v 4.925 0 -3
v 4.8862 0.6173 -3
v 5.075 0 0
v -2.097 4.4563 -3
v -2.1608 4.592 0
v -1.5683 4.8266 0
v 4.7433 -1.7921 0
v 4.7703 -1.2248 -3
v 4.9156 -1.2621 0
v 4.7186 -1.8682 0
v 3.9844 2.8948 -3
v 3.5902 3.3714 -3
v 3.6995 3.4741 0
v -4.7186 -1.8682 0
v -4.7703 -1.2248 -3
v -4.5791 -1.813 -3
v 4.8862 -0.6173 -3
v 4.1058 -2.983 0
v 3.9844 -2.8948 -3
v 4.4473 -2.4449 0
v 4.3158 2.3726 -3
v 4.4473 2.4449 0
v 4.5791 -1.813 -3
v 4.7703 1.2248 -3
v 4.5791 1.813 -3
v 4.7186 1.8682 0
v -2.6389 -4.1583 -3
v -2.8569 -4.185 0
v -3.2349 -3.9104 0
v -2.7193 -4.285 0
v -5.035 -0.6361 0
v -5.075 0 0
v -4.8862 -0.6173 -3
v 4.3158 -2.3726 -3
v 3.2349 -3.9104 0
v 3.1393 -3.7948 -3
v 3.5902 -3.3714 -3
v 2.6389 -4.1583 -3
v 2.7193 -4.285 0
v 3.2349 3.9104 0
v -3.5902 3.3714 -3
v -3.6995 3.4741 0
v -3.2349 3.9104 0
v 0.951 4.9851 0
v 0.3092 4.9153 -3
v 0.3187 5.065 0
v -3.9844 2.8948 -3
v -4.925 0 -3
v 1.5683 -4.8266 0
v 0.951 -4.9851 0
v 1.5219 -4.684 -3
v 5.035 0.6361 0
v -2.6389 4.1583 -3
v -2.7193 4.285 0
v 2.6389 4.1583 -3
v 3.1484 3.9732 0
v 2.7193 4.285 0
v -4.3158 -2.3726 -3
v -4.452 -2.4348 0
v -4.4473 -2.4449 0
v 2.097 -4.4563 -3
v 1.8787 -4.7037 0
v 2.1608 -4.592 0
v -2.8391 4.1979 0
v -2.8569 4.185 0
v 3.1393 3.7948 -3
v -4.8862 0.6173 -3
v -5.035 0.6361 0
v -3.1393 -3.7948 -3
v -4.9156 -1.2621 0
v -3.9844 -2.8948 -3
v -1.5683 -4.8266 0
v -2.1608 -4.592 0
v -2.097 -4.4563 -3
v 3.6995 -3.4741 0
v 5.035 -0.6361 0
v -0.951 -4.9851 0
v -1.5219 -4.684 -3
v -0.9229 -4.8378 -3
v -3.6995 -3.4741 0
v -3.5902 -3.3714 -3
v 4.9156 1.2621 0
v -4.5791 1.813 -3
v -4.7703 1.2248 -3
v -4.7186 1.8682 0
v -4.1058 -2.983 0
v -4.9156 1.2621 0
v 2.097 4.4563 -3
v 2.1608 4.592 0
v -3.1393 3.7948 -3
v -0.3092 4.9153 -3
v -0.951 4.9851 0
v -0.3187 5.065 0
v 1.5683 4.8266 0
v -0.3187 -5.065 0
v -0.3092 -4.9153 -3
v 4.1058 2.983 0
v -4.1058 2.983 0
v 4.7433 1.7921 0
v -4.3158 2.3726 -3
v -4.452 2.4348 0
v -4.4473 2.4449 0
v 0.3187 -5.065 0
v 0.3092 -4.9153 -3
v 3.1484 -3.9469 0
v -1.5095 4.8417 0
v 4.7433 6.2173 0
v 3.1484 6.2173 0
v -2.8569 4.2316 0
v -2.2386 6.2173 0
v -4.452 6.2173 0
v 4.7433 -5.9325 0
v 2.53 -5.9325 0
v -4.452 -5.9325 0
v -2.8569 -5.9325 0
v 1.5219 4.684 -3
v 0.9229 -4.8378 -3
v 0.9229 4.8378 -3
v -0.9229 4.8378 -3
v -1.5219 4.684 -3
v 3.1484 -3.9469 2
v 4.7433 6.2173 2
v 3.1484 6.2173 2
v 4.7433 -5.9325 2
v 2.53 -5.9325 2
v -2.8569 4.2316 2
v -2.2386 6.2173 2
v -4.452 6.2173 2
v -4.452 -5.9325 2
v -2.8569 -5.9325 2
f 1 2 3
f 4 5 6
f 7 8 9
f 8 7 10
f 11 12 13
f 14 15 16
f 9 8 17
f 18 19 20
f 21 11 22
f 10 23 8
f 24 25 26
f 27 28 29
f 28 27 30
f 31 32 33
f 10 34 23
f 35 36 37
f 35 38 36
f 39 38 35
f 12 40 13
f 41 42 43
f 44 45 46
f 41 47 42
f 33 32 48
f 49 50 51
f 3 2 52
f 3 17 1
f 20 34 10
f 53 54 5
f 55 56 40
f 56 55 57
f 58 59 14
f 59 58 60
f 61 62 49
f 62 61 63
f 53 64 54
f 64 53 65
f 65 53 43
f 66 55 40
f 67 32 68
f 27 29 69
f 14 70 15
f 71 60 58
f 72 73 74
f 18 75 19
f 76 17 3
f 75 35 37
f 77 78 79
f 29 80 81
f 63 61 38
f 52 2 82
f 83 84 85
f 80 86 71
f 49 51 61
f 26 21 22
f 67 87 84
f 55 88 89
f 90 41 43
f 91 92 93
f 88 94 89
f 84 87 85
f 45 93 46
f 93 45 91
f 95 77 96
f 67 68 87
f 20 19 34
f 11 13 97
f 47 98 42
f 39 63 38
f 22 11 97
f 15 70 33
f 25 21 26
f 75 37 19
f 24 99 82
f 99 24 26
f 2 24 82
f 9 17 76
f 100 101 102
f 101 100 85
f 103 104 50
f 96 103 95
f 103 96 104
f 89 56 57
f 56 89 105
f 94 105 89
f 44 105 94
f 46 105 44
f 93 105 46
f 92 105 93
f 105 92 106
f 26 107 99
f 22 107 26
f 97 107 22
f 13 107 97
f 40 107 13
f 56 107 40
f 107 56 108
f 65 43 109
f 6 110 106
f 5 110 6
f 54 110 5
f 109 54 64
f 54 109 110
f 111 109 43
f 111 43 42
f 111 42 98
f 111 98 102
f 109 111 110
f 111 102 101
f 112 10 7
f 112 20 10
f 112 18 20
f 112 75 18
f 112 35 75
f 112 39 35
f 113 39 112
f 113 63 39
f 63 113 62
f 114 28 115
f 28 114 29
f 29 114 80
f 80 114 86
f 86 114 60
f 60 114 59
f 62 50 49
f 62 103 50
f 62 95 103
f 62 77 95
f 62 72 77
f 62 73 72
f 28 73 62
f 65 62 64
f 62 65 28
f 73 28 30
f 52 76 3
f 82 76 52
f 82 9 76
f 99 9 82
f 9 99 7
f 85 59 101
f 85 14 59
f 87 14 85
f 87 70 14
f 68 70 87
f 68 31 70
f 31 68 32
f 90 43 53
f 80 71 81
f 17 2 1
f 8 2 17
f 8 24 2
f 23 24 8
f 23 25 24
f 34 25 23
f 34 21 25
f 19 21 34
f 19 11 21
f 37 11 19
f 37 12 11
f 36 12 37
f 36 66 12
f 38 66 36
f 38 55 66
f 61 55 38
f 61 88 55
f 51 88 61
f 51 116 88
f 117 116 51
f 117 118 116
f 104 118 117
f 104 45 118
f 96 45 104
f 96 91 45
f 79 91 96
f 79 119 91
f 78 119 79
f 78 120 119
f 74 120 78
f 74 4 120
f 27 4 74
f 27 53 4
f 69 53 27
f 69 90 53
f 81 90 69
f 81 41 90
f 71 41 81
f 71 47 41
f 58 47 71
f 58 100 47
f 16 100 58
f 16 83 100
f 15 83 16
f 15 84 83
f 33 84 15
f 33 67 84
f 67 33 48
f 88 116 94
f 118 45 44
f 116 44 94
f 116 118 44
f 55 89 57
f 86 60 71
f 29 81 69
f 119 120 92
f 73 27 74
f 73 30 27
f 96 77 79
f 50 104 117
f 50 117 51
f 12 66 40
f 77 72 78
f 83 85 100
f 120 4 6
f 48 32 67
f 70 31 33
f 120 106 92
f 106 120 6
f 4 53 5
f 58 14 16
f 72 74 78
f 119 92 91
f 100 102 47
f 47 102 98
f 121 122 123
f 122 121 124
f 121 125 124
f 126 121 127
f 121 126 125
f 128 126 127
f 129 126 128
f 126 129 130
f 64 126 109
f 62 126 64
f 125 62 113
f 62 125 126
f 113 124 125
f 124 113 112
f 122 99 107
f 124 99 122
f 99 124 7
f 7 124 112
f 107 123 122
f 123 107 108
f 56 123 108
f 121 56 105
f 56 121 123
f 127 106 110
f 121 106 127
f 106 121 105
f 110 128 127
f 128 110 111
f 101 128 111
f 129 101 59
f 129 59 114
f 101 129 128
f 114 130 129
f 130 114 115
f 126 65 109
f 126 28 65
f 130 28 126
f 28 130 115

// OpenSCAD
$fn = 50;


difference() {
	union() {
		translate(v = [0, 0, -3.0000000000]) {
			cylinder(h = 3, r1 = 4.9250000000, r2 = 5.0750000000);
		}
		linear_extrude(height = 2) {
			text(font = "Impact", halign = "center", size = 12, text = "N", valign = "center");
		}
	}
	union();
}
